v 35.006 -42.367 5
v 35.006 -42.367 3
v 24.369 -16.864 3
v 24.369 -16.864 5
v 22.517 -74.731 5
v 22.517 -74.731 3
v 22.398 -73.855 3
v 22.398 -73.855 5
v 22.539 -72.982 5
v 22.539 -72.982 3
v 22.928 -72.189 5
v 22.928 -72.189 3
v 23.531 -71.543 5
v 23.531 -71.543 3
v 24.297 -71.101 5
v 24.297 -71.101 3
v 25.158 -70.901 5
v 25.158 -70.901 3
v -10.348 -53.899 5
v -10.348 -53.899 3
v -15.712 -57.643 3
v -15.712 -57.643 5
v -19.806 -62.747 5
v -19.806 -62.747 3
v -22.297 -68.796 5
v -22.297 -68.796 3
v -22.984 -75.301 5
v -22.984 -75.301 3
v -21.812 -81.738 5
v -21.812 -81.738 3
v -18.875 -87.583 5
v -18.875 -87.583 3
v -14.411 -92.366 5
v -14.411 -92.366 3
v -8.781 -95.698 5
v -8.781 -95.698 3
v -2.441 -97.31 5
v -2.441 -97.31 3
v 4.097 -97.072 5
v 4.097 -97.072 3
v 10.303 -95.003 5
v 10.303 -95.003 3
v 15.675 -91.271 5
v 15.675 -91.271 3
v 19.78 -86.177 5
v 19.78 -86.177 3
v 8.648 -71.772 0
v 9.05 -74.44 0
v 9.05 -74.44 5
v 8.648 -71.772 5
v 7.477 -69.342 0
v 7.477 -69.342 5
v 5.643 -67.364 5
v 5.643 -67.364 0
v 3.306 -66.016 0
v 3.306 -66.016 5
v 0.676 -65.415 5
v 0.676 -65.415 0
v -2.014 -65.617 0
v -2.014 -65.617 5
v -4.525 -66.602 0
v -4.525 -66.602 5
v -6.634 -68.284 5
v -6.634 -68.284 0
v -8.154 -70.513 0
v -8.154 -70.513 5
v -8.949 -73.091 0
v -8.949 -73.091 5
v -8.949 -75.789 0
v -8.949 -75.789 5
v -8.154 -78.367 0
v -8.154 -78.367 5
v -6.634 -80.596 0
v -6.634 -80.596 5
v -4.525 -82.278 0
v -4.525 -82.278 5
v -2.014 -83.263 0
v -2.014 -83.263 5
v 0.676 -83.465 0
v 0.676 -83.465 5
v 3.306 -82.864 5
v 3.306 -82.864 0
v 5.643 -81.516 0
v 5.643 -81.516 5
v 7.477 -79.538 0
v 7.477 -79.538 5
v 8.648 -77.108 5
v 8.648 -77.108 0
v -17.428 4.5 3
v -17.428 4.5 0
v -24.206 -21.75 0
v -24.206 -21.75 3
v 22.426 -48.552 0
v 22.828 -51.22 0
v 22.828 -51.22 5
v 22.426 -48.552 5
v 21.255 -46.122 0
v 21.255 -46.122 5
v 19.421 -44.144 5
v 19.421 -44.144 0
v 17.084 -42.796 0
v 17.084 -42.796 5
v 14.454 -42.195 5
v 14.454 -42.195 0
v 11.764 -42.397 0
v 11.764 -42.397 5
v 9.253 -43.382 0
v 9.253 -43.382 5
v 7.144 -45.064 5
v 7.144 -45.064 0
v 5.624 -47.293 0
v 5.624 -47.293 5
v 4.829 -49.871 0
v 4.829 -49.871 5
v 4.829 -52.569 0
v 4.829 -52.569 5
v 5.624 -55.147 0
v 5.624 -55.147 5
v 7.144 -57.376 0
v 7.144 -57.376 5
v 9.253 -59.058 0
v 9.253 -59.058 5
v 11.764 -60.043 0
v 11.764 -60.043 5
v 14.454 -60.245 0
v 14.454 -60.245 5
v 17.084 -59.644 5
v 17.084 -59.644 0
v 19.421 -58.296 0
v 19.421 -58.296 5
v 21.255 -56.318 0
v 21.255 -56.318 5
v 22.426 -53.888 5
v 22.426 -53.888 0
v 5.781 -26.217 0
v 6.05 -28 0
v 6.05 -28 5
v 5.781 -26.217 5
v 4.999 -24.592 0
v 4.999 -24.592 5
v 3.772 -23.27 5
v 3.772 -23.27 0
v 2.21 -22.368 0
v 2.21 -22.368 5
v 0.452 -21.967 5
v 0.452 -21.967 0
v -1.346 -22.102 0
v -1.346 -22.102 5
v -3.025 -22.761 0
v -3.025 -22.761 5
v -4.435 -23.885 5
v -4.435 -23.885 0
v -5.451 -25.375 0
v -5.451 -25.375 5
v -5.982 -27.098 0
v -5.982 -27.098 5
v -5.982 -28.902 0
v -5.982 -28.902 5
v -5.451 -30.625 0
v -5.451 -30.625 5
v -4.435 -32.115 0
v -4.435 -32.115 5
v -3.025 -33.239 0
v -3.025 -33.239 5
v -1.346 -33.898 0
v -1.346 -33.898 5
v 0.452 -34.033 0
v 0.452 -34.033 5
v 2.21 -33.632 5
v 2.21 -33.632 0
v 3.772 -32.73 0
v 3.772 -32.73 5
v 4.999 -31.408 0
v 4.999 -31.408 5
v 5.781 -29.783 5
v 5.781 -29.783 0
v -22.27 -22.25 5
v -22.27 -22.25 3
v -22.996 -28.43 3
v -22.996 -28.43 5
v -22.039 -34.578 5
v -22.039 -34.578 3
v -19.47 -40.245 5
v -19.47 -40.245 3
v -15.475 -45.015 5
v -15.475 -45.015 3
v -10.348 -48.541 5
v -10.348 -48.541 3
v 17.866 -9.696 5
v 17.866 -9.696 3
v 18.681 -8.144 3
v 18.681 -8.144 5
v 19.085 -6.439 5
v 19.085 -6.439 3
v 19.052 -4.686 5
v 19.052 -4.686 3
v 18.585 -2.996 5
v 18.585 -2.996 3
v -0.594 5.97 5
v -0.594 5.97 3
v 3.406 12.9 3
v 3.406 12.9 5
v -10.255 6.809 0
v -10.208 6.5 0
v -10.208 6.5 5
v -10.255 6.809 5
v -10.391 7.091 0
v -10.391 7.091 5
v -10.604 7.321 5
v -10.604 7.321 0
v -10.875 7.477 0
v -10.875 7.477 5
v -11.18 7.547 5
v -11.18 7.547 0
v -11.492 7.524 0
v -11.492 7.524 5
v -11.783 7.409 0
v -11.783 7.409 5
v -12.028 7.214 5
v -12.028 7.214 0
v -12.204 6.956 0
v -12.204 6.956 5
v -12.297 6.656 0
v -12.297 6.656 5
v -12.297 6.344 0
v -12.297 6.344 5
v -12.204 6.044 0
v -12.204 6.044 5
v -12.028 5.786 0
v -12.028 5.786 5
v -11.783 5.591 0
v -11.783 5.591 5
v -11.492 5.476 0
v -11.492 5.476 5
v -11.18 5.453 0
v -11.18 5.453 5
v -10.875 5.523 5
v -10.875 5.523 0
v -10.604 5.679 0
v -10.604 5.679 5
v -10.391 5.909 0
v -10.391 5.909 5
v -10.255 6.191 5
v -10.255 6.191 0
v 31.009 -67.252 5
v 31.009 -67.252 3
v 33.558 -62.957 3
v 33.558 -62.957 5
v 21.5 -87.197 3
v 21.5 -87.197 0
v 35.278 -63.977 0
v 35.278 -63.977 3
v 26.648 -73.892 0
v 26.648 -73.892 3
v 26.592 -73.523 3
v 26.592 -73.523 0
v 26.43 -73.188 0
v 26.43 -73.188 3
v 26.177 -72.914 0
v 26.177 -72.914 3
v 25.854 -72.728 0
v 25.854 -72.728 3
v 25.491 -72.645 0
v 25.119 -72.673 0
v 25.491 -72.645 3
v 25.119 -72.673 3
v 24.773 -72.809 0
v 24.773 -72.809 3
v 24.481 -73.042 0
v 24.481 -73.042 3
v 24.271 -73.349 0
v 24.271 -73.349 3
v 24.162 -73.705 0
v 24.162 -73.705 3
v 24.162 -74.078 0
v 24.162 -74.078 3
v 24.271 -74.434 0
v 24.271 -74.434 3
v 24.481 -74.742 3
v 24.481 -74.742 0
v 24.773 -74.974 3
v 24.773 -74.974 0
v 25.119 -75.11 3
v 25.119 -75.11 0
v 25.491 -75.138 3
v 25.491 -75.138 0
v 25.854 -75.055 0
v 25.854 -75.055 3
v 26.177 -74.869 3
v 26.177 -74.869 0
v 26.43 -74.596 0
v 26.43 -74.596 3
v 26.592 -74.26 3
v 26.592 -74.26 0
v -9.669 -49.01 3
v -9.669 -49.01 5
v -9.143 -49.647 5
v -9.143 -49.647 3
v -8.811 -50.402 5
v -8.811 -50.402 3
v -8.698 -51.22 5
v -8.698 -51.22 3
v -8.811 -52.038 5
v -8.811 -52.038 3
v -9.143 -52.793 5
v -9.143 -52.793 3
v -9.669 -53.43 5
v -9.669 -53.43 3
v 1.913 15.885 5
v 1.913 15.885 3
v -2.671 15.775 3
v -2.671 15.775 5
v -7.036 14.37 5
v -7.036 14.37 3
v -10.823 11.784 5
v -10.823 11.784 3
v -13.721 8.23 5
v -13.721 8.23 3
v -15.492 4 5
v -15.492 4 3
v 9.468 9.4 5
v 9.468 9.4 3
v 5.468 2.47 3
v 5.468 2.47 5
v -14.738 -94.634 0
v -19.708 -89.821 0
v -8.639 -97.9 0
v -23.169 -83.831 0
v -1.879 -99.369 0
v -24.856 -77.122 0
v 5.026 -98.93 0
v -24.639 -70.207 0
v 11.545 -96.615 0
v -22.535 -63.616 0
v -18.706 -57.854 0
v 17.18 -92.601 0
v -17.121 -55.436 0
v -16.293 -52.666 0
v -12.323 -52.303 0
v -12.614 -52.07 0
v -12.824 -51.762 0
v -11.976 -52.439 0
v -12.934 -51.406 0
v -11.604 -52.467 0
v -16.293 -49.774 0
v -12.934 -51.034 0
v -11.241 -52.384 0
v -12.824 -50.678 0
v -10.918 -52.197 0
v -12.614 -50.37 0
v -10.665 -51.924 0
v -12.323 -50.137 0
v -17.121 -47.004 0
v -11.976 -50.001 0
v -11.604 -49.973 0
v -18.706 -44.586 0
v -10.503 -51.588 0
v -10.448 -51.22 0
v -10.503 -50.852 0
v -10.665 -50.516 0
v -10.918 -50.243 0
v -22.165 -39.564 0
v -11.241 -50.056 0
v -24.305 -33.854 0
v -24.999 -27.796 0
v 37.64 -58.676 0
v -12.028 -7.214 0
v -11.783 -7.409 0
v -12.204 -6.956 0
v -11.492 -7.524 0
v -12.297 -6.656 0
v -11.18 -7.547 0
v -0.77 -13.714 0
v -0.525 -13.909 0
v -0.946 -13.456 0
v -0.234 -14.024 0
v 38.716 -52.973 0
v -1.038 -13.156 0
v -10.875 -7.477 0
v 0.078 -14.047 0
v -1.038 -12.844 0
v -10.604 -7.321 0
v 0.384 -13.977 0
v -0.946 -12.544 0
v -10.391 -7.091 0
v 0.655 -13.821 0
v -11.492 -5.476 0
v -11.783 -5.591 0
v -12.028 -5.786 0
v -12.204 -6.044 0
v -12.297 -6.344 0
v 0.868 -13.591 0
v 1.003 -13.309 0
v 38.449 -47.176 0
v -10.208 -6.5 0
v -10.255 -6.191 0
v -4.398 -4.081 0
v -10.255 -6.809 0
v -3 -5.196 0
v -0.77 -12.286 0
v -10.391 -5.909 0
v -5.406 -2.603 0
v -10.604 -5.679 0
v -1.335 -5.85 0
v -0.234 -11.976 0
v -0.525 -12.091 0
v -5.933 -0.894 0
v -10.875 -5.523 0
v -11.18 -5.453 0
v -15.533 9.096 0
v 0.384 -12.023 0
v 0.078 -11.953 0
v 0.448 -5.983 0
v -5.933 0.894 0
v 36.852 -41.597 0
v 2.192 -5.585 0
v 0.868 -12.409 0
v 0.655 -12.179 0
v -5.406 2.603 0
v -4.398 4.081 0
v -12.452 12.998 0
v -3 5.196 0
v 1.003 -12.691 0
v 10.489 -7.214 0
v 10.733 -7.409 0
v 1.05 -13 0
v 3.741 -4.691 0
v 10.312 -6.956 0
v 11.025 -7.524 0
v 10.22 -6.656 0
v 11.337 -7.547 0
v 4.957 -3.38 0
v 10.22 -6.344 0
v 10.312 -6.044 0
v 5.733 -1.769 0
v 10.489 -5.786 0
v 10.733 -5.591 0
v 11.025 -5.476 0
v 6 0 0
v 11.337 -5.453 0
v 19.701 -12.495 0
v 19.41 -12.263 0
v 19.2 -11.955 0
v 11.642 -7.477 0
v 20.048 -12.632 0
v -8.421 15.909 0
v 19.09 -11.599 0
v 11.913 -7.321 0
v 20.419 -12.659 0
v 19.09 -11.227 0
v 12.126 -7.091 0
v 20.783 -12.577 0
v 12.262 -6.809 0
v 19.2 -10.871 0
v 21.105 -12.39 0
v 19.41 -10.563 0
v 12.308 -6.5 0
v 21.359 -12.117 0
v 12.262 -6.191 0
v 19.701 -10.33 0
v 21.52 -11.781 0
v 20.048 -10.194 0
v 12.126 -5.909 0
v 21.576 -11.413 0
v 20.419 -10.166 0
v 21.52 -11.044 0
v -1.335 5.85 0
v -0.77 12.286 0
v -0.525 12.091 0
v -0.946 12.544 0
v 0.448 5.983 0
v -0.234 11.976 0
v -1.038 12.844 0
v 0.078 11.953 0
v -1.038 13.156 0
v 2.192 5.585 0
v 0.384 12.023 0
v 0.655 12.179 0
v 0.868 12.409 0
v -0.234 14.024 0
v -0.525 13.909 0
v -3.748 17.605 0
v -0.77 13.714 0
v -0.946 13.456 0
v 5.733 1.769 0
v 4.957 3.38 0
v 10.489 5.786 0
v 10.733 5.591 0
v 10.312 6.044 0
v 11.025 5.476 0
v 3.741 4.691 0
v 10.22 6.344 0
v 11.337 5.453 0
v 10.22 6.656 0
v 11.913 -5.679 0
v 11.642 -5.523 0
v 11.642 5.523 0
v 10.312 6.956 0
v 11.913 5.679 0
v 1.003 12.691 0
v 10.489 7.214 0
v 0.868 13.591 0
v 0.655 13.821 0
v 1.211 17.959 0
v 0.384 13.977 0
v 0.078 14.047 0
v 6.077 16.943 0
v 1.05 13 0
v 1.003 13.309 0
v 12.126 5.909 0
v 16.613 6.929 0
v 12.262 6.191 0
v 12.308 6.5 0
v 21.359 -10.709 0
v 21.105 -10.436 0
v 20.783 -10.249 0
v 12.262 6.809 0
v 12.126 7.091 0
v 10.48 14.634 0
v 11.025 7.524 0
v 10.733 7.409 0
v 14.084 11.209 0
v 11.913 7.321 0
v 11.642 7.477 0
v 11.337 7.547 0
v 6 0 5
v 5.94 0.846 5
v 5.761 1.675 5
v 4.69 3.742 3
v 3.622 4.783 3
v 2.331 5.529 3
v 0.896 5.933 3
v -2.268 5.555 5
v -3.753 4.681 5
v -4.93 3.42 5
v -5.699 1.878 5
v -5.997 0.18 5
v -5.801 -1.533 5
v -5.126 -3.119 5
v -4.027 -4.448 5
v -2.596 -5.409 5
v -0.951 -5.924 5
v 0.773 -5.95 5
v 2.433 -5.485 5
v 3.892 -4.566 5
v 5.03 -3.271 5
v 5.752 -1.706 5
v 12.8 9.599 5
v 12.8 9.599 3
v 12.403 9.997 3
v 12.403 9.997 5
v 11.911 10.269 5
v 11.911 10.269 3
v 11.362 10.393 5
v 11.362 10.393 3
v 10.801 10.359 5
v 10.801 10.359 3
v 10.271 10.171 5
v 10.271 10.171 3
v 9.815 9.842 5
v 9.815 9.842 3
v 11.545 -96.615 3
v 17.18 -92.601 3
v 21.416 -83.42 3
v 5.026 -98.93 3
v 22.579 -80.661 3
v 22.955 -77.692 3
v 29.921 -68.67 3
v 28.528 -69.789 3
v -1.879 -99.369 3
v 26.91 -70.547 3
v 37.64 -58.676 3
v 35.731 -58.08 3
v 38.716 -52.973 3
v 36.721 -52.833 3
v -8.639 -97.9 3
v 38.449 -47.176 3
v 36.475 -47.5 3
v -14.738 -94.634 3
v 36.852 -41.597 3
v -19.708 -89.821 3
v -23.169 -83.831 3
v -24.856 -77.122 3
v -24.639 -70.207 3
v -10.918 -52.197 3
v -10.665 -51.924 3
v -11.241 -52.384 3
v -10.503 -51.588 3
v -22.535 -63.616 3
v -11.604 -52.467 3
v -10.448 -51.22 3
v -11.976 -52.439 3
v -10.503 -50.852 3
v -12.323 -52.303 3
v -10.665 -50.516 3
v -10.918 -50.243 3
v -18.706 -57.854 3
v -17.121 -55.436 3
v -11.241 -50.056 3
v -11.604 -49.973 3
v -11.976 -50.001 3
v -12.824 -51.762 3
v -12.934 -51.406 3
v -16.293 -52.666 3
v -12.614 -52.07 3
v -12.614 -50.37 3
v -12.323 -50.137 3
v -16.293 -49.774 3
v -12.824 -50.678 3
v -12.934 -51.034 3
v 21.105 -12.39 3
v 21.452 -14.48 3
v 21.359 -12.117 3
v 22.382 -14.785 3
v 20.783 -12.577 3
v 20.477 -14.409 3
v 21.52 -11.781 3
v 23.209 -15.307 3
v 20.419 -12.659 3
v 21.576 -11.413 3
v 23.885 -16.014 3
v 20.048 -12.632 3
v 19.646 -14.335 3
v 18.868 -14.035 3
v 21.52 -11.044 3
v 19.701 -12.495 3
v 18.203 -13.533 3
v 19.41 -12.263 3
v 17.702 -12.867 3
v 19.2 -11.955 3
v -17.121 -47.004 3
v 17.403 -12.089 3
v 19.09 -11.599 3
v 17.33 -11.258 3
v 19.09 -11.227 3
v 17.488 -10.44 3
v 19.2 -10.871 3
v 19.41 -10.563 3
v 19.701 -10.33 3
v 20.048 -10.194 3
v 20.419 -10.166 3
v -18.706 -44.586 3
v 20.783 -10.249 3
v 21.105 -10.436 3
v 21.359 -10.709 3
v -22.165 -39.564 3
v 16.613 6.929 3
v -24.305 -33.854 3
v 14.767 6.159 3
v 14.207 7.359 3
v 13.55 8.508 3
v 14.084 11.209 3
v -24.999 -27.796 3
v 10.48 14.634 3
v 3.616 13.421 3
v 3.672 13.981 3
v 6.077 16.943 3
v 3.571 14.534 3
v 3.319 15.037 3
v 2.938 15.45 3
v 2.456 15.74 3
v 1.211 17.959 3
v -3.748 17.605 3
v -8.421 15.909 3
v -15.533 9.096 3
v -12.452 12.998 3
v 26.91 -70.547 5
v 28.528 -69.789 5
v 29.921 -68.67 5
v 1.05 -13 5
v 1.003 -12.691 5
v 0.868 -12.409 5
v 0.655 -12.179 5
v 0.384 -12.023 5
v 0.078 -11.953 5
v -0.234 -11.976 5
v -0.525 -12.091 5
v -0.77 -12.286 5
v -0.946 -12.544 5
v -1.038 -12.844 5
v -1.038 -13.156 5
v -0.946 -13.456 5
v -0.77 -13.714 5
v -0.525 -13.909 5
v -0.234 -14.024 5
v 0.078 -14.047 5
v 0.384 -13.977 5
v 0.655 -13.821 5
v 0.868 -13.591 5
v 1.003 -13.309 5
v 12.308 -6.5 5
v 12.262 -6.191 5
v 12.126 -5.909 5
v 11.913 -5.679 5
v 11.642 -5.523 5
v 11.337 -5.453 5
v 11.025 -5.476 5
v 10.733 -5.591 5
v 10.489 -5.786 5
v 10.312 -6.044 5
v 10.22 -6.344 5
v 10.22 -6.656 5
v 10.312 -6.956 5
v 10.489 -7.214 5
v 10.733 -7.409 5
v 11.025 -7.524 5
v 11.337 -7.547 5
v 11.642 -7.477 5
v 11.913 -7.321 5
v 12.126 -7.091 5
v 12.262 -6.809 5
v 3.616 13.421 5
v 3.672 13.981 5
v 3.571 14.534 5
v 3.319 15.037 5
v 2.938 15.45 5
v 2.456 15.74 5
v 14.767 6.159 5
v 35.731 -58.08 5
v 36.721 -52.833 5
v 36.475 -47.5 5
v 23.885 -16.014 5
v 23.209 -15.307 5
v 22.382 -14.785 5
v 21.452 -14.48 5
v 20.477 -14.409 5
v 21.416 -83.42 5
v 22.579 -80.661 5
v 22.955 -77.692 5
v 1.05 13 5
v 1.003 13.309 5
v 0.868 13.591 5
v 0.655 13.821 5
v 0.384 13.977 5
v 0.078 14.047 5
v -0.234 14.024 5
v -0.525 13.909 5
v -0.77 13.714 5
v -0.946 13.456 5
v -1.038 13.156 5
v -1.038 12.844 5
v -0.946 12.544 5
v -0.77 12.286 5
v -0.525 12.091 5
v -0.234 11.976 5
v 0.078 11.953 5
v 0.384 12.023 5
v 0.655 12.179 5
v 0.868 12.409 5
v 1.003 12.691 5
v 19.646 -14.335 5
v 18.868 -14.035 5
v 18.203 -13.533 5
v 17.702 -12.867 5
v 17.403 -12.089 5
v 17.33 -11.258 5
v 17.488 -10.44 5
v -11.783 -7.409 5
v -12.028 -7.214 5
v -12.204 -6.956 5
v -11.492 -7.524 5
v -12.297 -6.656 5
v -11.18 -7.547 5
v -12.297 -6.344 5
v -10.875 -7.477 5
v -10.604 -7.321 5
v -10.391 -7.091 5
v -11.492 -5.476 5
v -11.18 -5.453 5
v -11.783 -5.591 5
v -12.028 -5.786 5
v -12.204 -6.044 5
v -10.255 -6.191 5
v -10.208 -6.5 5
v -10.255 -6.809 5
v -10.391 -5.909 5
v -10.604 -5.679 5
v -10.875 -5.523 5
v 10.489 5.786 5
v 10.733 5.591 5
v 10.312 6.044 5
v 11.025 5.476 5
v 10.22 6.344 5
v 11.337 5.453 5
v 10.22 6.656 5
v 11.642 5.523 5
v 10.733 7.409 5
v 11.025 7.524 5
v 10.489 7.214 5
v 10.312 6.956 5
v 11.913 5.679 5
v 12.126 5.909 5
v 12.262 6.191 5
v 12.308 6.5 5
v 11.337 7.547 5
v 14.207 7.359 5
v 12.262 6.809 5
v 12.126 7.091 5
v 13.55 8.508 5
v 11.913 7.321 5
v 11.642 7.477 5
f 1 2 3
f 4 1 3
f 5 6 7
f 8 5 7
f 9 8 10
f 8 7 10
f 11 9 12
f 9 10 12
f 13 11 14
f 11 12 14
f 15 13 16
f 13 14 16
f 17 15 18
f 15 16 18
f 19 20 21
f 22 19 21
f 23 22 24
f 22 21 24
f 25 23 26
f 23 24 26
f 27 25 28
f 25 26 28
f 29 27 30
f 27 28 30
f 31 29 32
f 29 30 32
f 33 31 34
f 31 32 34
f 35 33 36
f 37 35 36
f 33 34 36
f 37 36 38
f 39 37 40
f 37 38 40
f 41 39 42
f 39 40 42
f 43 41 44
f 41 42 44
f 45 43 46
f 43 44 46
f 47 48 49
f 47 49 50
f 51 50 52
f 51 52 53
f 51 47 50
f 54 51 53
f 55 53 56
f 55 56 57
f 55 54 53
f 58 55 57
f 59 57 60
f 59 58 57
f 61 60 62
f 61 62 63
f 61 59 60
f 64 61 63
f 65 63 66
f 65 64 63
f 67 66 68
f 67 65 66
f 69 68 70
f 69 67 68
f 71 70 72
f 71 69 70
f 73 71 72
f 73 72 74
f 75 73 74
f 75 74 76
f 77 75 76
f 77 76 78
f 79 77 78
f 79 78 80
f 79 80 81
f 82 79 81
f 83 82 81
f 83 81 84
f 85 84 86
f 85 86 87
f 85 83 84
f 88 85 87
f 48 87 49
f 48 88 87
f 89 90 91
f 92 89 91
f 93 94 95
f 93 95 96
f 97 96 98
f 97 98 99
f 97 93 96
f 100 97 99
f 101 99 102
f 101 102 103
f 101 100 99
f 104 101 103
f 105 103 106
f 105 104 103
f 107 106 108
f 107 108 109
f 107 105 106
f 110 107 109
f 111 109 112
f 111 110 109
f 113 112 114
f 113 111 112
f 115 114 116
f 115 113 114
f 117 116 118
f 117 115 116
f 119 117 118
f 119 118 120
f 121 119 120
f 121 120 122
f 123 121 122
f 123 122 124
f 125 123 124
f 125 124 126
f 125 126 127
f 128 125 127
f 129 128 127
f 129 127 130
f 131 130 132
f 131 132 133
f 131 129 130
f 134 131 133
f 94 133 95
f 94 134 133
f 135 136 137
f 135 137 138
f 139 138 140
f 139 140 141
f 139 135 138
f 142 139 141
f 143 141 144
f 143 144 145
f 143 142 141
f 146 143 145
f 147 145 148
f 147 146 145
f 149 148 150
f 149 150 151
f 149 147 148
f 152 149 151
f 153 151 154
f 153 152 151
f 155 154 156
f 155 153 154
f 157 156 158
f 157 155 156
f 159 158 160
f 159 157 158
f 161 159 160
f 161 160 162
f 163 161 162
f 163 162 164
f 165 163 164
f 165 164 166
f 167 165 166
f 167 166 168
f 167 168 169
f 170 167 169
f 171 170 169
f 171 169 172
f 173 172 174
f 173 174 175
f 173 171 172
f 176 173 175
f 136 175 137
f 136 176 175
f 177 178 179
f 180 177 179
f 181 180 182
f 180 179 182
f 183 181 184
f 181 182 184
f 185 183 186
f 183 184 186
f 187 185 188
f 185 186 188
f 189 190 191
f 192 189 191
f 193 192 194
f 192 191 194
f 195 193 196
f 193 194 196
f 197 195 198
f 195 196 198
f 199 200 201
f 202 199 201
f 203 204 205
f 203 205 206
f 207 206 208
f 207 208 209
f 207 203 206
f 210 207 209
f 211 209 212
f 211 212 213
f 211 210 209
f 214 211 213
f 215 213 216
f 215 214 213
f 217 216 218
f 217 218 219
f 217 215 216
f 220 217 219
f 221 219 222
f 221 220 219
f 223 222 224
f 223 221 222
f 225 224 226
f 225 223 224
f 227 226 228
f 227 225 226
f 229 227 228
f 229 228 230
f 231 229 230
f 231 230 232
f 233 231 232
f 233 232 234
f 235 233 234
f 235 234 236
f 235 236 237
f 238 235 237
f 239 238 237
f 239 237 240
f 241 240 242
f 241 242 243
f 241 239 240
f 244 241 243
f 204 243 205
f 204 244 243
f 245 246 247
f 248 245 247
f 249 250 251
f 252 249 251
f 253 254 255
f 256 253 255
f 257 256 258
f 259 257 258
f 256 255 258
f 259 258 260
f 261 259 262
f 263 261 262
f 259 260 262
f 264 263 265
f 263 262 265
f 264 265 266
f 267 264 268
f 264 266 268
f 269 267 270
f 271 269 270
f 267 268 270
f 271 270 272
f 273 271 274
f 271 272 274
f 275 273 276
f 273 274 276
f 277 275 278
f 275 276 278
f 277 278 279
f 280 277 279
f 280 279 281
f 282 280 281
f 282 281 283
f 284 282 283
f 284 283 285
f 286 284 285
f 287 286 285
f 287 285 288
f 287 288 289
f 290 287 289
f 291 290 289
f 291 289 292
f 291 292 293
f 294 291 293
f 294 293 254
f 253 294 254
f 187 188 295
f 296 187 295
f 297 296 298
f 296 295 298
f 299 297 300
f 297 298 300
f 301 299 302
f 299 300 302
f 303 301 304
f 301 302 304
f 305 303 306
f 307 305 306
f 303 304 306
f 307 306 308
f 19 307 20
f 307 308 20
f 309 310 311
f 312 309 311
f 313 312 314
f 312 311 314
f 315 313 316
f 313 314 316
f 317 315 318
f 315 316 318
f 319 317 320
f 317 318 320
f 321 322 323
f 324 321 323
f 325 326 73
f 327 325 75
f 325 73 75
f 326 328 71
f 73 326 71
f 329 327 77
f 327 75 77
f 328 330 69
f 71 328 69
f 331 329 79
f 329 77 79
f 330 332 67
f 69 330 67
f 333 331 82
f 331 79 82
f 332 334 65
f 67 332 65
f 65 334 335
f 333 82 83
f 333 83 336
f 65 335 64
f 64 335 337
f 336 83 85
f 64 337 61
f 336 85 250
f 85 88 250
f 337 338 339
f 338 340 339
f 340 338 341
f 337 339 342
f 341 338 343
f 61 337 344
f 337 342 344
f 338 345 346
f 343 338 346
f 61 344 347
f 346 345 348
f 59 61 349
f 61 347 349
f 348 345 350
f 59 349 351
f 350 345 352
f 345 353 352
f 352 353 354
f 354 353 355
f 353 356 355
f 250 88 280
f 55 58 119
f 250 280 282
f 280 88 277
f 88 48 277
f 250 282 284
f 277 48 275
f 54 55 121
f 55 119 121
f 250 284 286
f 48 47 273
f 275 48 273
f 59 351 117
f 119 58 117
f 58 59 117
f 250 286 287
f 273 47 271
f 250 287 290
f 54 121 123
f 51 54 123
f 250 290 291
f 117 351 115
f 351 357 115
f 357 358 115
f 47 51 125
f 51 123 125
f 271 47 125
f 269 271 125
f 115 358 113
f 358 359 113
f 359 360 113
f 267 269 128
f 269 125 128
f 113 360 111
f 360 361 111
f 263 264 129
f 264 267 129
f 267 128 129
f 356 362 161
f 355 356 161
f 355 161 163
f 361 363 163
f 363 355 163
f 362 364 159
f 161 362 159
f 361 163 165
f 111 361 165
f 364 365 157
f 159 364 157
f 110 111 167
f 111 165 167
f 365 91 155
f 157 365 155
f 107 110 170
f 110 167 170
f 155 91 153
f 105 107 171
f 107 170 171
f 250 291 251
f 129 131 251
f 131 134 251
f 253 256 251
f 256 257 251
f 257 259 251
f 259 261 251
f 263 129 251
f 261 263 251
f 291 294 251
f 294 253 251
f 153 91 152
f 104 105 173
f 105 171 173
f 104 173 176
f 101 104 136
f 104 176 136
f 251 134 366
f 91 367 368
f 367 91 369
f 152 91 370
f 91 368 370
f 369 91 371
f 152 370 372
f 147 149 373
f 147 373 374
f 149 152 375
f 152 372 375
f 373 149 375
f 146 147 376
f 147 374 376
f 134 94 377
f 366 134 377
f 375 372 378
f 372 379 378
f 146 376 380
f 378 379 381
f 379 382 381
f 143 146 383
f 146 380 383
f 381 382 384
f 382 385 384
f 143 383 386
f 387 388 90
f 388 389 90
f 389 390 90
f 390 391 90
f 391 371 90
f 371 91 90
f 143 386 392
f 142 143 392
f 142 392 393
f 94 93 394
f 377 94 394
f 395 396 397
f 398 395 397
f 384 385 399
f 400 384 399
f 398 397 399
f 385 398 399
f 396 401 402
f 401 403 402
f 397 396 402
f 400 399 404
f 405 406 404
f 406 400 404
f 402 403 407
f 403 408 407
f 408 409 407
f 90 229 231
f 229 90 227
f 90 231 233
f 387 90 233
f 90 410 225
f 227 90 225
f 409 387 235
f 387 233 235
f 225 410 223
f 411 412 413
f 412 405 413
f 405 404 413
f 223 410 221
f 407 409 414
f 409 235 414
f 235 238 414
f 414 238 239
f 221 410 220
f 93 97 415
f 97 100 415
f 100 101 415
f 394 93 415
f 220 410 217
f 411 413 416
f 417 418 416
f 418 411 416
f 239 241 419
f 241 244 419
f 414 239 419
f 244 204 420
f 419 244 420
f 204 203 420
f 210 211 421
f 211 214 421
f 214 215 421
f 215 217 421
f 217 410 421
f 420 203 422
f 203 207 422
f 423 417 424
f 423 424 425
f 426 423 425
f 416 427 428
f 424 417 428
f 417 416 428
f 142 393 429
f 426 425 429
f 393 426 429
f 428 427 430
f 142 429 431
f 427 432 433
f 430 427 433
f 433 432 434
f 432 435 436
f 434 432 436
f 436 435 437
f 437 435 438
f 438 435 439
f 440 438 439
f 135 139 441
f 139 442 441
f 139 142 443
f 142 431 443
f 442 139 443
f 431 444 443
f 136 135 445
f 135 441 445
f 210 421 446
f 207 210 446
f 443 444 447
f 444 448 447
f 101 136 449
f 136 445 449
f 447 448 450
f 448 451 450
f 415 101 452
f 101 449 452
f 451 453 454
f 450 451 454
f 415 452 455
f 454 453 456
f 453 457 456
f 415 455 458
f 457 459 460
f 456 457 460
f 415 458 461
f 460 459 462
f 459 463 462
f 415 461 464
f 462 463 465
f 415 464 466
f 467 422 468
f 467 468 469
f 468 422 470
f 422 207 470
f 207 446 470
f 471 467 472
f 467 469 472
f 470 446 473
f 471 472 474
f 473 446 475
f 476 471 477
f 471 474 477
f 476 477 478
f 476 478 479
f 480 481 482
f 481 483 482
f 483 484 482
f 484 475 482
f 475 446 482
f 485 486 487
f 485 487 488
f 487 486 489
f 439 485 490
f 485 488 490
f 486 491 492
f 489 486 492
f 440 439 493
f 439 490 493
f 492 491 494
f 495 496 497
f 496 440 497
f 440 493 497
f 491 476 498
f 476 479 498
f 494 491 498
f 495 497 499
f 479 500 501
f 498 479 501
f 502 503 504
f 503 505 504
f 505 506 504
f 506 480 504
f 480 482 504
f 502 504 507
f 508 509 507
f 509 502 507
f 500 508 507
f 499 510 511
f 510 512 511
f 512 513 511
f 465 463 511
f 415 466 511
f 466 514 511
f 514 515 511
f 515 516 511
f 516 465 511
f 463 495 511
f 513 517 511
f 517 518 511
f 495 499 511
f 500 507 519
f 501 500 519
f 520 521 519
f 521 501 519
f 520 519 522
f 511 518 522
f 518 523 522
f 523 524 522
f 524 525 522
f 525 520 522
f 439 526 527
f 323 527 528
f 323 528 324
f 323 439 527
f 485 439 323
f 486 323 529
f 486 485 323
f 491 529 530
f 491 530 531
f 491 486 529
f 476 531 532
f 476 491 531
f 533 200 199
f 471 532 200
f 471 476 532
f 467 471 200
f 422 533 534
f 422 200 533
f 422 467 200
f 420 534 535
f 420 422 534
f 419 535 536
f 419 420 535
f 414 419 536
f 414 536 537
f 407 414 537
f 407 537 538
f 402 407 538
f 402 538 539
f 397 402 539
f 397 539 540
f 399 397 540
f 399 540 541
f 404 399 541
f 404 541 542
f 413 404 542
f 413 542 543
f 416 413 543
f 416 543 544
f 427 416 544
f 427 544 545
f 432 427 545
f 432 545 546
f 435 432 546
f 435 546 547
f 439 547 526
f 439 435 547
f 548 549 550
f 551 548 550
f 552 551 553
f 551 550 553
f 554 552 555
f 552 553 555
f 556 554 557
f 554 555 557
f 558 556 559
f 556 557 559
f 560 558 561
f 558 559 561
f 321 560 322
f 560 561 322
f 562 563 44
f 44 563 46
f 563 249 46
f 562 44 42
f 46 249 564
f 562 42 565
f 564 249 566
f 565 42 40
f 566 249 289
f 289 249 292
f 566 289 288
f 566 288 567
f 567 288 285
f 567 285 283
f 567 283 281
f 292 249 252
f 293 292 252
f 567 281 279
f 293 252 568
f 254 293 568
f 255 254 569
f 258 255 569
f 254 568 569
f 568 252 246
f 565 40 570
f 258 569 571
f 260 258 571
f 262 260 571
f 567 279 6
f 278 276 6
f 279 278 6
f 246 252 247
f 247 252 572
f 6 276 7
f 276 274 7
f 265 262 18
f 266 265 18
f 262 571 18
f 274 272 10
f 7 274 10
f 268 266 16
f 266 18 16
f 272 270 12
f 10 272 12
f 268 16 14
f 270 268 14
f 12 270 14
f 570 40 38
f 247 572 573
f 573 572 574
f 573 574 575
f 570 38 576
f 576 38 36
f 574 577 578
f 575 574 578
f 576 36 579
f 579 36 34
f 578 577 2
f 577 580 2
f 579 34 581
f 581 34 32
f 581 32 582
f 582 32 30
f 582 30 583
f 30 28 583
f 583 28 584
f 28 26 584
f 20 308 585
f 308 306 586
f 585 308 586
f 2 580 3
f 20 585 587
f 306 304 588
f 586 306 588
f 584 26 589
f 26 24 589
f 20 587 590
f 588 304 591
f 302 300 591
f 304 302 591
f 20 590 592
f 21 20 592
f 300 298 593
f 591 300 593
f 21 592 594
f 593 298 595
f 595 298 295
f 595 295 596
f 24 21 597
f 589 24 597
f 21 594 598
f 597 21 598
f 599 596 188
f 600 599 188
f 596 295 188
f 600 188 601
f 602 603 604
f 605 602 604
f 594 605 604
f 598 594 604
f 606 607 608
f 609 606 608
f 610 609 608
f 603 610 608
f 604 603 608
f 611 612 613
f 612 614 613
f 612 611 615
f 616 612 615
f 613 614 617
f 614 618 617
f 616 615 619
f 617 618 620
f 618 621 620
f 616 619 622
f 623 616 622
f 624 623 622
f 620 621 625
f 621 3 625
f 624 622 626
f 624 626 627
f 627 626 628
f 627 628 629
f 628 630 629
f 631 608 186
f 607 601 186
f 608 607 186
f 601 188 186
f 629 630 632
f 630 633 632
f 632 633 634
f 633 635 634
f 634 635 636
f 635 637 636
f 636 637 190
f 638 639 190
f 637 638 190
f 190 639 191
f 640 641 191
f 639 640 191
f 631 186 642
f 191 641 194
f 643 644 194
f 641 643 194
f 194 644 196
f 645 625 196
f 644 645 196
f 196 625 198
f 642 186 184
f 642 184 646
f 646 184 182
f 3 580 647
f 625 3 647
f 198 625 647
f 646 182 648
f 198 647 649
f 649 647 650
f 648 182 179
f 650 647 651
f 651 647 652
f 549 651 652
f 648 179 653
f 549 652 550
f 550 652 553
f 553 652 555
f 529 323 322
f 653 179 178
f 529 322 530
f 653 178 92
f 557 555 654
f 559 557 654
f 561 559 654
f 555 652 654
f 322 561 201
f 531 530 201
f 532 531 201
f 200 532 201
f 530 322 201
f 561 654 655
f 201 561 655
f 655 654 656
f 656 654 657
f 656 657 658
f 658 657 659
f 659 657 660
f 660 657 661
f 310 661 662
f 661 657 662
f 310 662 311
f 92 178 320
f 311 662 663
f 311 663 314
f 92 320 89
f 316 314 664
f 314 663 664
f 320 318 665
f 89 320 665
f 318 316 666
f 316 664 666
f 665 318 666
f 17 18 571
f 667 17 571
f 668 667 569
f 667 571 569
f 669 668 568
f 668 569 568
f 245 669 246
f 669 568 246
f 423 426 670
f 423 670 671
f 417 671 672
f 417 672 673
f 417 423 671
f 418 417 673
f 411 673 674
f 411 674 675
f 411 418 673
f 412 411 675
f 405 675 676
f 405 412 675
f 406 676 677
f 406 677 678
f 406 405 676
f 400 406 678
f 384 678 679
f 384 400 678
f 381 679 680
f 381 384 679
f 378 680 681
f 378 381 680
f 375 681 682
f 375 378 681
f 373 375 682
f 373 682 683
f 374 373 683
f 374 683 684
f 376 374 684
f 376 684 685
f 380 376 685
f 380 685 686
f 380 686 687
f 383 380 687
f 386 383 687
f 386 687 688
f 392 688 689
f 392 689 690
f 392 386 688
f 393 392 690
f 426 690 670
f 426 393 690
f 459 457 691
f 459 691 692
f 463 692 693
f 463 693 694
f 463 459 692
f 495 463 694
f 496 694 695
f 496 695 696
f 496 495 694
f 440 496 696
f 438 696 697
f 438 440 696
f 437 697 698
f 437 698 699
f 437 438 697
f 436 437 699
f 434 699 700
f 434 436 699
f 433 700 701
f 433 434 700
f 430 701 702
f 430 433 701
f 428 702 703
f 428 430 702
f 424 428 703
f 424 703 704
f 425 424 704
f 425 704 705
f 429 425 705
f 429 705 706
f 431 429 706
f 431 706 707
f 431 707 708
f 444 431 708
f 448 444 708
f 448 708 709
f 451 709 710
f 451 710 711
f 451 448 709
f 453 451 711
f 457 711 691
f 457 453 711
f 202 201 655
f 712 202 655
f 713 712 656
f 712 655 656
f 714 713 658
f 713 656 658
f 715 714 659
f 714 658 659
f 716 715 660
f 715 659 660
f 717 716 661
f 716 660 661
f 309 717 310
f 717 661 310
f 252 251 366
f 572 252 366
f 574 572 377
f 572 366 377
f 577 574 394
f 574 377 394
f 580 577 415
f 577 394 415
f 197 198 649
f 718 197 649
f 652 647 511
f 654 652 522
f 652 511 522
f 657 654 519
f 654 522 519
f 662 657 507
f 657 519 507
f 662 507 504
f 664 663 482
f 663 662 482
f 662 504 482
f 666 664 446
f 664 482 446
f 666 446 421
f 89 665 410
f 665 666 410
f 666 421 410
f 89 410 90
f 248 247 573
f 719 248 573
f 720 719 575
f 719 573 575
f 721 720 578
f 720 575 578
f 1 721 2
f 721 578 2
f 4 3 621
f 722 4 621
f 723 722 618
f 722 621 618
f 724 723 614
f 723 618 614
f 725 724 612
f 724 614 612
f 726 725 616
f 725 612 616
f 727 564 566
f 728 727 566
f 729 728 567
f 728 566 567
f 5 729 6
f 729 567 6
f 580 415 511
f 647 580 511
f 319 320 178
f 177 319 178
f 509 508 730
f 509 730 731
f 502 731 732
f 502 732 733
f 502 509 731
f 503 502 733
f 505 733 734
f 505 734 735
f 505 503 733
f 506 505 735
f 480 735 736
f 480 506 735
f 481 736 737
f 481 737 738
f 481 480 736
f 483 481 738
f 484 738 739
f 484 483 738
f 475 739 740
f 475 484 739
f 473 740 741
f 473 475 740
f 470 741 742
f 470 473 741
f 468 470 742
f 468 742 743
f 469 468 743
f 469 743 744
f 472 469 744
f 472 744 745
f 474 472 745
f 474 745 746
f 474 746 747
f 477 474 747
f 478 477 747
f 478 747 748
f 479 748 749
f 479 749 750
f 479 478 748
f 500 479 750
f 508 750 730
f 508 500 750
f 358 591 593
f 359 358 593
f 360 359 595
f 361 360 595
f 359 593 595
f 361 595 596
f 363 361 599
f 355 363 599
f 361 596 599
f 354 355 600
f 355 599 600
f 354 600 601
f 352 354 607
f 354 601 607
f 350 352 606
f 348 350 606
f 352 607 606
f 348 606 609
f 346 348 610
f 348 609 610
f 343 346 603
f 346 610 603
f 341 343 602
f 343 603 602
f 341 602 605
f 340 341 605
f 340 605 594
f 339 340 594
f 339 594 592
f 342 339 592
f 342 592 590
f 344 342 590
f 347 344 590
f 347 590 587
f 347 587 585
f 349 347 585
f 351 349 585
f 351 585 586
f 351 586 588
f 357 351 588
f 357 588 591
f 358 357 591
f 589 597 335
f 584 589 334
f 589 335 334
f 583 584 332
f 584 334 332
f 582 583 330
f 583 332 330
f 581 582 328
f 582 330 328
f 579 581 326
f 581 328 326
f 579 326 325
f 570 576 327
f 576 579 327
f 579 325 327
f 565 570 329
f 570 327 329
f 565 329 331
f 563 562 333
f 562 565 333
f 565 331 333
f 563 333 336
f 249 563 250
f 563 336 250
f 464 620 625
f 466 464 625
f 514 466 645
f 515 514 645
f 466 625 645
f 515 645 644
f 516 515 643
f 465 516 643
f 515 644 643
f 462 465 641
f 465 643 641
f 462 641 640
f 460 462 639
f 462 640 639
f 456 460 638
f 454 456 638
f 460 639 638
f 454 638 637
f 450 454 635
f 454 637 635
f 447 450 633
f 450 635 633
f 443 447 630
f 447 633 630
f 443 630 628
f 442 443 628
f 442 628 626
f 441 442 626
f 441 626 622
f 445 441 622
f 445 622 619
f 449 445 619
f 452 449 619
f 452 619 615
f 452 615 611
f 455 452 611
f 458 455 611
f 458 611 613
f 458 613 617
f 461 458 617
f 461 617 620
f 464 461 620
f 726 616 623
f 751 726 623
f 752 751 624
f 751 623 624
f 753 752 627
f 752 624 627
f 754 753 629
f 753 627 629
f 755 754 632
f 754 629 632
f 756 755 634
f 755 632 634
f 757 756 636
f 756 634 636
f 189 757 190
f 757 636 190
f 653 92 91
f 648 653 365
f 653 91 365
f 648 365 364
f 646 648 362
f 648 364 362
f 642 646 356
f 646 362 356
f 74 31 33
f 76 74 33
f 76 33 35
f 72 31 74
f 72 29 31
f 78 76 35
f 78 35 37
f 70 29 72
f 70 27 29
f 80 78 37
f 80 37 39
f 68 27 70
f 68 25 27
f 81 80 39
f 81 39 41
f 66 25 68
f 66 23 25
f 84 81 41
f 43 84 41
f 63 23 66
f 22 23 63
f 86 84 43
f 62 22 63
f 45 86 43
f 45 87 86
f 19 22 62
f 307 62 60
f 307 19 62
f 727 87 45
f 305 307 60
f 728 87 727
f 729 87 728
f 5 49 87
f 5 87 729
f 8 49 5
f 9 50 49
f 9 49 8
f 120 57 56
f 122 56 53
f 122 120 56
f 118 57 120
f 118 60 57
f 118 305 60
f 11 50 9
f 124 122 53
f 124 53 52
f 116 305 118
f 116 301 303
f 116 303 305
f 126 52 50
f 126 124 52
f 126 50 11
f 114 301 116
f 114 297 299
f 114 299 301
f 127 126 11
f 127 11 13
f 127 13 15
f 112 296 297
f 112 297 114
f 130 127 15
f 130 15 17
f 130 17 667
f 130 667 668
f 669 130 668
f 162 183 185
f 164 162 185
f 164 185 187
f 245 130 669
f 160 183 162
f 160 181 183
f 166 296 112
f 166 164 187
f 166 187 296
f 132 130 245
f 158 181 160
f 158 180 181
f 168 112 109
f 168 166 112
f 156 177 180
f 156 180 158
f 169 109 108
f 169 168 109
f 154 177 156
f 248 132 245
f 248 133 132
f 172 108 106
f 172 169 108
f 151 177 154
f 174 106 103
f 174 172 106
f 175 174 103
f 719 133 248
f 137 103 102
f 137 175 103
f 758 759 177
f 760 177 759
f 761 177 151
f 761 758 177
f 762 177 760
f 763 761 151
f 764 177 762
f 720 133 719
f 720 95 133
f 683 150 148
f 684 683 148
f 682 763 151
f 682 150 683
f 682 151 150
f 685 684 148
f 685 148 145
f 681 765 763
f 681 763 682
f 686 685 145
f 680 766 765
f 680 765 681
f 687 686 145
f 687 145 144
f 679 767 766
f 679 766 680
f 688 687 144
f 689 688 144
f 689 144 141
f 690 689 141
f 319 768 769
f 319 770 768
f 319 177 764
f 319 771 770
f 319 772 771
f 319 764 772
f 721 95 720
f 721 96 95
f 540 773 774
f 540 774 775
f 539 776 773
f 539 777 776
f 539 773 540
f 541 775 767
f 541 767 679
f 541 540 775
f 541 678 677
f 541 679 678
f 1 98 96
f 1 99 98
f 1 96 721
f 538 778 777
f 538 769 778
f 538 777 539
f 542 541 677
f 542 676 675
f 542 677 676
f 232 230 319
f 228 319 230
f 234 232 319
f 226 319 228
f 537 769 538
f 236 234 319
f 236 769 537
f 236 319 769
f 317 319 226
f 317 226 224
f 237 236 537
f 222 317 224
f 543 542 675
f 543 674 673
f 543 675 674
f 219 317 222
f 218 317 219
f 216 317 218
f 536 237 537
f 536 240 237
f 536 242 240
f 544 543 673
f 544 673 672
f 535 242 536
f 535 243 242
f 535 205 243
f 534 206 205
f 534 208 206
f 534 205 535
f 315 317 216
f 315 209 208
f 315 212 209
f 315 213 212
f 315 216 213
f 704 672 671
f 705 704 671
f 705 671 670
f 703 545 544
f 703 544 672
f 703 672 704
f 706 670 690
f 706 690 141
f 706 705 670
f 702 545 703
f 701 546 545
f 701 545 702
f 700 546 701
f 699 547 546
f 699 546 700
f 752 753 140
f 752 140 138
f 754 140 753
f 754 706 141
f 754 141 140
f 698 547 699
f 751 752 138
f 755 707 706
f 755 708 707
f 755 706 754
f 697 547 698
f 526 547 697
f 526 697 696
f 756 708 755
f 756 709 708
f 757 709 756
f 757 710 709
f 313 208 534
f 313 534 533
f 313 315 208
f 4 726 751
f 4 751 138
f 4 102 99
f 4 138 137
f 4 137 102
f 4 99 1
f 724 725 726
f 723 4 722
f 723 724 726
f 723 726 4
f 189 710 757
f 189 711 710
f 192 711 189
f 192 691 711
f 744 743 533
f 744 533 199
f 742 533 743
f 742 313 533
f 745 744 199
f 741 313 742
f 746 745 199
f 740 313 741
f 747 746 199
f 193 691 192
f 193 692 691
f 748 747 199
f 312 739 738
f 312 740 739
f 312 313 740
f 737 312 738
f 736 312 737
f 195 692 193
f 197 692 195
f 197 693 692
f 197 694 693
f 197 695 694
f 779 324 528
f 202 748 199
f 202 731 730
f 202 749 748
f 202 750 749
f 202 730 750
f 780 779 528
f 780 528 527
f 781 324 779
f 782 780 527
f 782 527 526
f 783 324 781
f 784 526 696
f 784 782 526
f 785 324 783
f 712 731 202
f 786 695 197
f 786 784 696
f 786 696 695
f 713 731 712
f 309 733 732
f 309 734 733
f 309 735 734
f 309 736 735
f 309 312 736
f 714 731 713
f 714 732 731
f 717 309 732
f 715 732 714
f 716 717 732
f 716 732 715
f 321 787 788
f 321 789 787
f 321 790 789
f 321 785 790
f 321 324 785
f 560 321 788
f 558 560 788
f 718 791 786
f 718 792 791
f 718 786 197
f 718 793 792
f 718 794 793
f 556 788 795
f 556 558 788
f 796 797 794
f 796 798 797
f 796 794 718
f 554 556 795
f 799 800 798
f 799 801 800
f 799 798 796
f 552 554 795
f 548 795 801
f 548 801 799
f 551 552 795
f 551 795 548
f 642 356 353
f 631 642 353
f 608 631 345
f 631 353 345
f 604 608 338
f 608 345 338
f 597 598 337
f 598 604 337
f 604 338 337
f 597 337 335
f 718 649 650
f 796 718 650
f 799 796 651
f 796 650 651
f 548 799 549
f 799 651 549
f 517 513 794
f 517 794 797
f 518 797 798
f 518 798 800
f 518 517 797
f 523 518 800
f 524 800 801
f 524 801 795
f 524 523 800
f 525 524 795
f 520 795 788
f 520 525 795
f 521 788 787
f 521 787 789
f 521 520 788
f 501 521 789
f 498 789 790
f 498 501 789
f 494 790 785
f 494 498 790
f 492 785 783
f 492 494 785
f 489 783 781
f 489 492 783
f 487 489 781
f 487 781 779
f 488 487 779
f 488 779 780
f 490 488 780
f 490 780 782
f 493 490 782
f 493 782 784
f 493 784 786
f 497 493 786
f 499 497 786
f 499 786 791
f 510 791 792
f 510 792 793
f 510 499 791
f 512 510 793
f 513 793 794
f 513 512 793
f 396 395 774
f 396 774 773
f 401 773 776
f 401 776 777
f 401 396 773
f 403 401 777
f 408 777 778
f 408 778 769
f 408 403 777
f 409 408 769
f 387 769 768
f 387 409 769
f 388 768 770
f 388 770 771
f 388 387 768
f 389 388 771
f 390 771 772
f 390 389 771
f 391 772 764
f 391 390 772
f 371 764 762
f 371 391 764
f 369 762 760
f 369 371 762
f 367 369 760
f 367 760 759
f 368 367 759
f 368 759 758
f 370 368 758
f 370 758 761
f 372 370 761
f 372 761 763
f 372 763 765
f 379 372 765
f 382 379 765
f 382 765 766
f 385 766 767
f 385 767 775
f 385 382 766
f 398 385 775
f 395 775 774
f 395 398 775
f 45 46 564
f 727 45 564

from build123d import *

# Parameters (mm, degrees)
SKETCH1_R           = 6
SKETCH1_R_2         = 6.05
SKETCH1_R_3         = 9.05
SKETCH1_R_4         = 1.05
BOSS_EXTRUDE1_DEPTH = 5
CUT_EXTRUDE1_START  = -2
CUT_EXTRUDE1_DEPTH  = 2
SKETCH3_R           = 1.25
CUT_EXTRUDE2_DEPTH  = 107.775662697


with BuildPart() as part:
    # Sketch1 → Boss-Extrude1 (new body)
    with BuildSketch(Plane.XY):
        with BuildLine():
            Line((-17.428425058, 4.5), (-24.206145914, -21.75))
            ThreePointArc((-24.206145914, -21.75), (-24.304944461, -33.854030643), (-18.705990528, -44.585714286))
            ThreePointArc((-18.705990528, -44.585714286), (-16.188386739, -51.22), (-18.705990528, -57.854285714))
            ThreePointArc((-18.705990528, -57.854285714), (-14.737892988, -94.633922608), (21.5, -87.197350822))
            Line((21.5, -87.197350822), (35.277938888, -63.977350822))
            ThreePointArc((35.277938888, -63.977350822), (38.71637128, -52.973450833), (36.851550967, -41.59667284))
            Line((36.851550967, -41.59667284), (16.613000697, 6.928795555))
            ThreePointArc((16.613000697, 6.928795555), (-1.281011782, 17.954359048), (-17.428425058, 4.5))
        make_face()
        Circle(SKETCH1_R, mode=Mode.SUBTRACT)
        with Locations((0, -28)):
            Circle(SKETCH1_R_2, mode=Mode.SUBTRACT)
        with Locations((13.777938888, -51.22)):
            Circle(SKETCH1_R_3, mode=Mode.SUBTRACT)
        with Locations((0, -74.44)):
            Circle(SKETCH1_R_3, mode=Mode.SUBTRACT)
        with Locations((0, 13)):
            Circle(SKETCH1_R_4, mode=Mode.SUBTRACT)
        with Locations((11.258330249, 6.5)):
            Circle(SKETCH1_R_4, mode=Mode.SUBTRACT)
        with Locations((11.258330249, -6.5)):
            Circle(SKETCH1_R_4, mode=Mode.SUBTRACT)
        with Locations((0, -13)):
            Circle(SKETCH1_R_4, mode=Mode.SUBTRACT)
        with Locations((-11.258330249, -6.5)):
            Circle(SKETCH1_R_4, mode=Mode.SUBTRACT)
        with Locations((-11.258330249, 6.5)):
            Circle(SKETCH1_R_4, mode=Mode.SUBTRACT)
    extrude(amount=BOSS_EXTRUDE1_DEPTH)

    # Sketch2 → Cut-Extrude1 (cut)
    with BuildSketch(Plane.XY.offset(5).offset(CUT_EXTRUDE1_START)):
        with BuildLine():
            Line((16.613000697, 6.928795555), (36.851550967, -41.59667284))
            ThreePointArc((36.851550967, -41.59667284), (38.71637128, -52.973450833), (35.277938888, -63.977350822))
            Line((35.277938888, -63.977350822), (21.5, -87.197350822))
            ThreePointArc((21.5, -87.197350822), (-14.737892988, -94.633922608), (-18.705990528, -57.854285714))
            ThreePointArc((-18.705990528, -57.854285714), (-16.188386739, -51.22), (-18.705990528, -44.585714286))
            ThreePointArc((-18.705990528, -44.585714286), (-24.304944461, -33.854030643), (-24.206145914, -21.75))
            Line((-24.206145914, -21.75), (-17.428425058, 4.5))
            ThreePointArc((-17.428425058, 4.5), (-1.281011782, 17.954359048), (16.613000697, 6.928795555))
        make_face()
        with BuildLine():
            Line((9.468285508, 9.39955156), (5.467787499, 2.470485754))
            ThreePointArc((5.467787499, 2.470485754), (3, 5.196152423), (-0.594390327, 5.970485754))
            Line((-0.594390327, 5.970485754), (3.406107682, 12.89955156))
            ThreePointArc((3.406107682, 12.89955156), (3.46289335, 14.794014563), (1.913207856, 15.885201783))
            ThreePointArc((1.913207856, 15.885201783), (-9.022746373, 13.213252737), (-15.491933385, 4))
            Line((-15.491933385, 4), (-22.269654241, -22.25))
            ThreePointArc((-22.269654241, -22.25), (-20.946970822, -37.498653241), (-10.347792006, -48.540769231))
            ThreePointArc((-10.347792006, -48.540769231), (-8.697504007, -51.22), (-10.347792006, -53.899230769))
            ThreePointArc((-10.347792006, -53.899230769), (-16.813726675, -90.133903125), (19.78, -86.176762756))
            Line((19.78, -86.176762756), (21.416047429, -83.419527323))
            ThreePointArc((21.416047429, -83.419527323), (22.868749584, -79.189380689), (22.517294907, -74.730573258))
            ThreePointArc((22.517294907, -74.730573258), (22.927957655, -72.188598464), (25.15802624, -70.901324657))
            ThreePointArc((25.15802624, -70.901324657), (28.527716294, -69.789192601), (31.009004018, -67.252490018))
            Line((31.009004018, -67.252490018), (33.557938888, -62.956762756))
            ThreePointArc((33.557938888, -62.956762756), (36.721296689, -52.833174766), (35.005662001, -42.366539013))
            Line((35.005662001, -42.366539013), (24.369440107, -16.864334436))
            ThreePointArc((24.369440107, -16.864334436), (22.811532345, -15.020784633), (20.47666212, -14.409120101))
            ThreePointArc((20.47666212, -14.409120101), (17.701744194, -12.866781789), (17.865596008, -9.696272437))
            ThreePointArc((17.865596008, -9.696272437), (19.084800596, -6.438585473), (18.585469893, -2.996252973))
            Line((18.585469893, -2.996252973), (14.76711173, 6.158929383))
            ThreePointArc((14.76711173, 6.158929383), (13.890682857, 7.940335621), (12.800384361, 9.599487498))
            ThreePointArc((12.800384361, 9.599487498), (11.080545761, 10.395960893), (9.468285508, 9.39955156))
        make_face(mode=Mode.SUBTRACT)
    extrude(amount=CUT_EXTRUDE1_DEPTH, mode=Mode.SUBTRACT)

    # Sketch3 → Cut-Extrude2 (cut, through all)
    with BuildSketch(Plane.XY.offset(3)):
        with Locations((20.325912078, -11.412910091)):
            Circle(SKETCH3_R)
        with Locations((-11.697504007, -51.22)):
            Circle(SKETCH3_R)
        with Locations((25.397635129, -73.891740611)):
            Circle(SKETCH3_R)
    extrude(amount=-CUT_EXTRUDE2_DEPTH, mode=Mode.SUBTRACT)


solid = part.part
